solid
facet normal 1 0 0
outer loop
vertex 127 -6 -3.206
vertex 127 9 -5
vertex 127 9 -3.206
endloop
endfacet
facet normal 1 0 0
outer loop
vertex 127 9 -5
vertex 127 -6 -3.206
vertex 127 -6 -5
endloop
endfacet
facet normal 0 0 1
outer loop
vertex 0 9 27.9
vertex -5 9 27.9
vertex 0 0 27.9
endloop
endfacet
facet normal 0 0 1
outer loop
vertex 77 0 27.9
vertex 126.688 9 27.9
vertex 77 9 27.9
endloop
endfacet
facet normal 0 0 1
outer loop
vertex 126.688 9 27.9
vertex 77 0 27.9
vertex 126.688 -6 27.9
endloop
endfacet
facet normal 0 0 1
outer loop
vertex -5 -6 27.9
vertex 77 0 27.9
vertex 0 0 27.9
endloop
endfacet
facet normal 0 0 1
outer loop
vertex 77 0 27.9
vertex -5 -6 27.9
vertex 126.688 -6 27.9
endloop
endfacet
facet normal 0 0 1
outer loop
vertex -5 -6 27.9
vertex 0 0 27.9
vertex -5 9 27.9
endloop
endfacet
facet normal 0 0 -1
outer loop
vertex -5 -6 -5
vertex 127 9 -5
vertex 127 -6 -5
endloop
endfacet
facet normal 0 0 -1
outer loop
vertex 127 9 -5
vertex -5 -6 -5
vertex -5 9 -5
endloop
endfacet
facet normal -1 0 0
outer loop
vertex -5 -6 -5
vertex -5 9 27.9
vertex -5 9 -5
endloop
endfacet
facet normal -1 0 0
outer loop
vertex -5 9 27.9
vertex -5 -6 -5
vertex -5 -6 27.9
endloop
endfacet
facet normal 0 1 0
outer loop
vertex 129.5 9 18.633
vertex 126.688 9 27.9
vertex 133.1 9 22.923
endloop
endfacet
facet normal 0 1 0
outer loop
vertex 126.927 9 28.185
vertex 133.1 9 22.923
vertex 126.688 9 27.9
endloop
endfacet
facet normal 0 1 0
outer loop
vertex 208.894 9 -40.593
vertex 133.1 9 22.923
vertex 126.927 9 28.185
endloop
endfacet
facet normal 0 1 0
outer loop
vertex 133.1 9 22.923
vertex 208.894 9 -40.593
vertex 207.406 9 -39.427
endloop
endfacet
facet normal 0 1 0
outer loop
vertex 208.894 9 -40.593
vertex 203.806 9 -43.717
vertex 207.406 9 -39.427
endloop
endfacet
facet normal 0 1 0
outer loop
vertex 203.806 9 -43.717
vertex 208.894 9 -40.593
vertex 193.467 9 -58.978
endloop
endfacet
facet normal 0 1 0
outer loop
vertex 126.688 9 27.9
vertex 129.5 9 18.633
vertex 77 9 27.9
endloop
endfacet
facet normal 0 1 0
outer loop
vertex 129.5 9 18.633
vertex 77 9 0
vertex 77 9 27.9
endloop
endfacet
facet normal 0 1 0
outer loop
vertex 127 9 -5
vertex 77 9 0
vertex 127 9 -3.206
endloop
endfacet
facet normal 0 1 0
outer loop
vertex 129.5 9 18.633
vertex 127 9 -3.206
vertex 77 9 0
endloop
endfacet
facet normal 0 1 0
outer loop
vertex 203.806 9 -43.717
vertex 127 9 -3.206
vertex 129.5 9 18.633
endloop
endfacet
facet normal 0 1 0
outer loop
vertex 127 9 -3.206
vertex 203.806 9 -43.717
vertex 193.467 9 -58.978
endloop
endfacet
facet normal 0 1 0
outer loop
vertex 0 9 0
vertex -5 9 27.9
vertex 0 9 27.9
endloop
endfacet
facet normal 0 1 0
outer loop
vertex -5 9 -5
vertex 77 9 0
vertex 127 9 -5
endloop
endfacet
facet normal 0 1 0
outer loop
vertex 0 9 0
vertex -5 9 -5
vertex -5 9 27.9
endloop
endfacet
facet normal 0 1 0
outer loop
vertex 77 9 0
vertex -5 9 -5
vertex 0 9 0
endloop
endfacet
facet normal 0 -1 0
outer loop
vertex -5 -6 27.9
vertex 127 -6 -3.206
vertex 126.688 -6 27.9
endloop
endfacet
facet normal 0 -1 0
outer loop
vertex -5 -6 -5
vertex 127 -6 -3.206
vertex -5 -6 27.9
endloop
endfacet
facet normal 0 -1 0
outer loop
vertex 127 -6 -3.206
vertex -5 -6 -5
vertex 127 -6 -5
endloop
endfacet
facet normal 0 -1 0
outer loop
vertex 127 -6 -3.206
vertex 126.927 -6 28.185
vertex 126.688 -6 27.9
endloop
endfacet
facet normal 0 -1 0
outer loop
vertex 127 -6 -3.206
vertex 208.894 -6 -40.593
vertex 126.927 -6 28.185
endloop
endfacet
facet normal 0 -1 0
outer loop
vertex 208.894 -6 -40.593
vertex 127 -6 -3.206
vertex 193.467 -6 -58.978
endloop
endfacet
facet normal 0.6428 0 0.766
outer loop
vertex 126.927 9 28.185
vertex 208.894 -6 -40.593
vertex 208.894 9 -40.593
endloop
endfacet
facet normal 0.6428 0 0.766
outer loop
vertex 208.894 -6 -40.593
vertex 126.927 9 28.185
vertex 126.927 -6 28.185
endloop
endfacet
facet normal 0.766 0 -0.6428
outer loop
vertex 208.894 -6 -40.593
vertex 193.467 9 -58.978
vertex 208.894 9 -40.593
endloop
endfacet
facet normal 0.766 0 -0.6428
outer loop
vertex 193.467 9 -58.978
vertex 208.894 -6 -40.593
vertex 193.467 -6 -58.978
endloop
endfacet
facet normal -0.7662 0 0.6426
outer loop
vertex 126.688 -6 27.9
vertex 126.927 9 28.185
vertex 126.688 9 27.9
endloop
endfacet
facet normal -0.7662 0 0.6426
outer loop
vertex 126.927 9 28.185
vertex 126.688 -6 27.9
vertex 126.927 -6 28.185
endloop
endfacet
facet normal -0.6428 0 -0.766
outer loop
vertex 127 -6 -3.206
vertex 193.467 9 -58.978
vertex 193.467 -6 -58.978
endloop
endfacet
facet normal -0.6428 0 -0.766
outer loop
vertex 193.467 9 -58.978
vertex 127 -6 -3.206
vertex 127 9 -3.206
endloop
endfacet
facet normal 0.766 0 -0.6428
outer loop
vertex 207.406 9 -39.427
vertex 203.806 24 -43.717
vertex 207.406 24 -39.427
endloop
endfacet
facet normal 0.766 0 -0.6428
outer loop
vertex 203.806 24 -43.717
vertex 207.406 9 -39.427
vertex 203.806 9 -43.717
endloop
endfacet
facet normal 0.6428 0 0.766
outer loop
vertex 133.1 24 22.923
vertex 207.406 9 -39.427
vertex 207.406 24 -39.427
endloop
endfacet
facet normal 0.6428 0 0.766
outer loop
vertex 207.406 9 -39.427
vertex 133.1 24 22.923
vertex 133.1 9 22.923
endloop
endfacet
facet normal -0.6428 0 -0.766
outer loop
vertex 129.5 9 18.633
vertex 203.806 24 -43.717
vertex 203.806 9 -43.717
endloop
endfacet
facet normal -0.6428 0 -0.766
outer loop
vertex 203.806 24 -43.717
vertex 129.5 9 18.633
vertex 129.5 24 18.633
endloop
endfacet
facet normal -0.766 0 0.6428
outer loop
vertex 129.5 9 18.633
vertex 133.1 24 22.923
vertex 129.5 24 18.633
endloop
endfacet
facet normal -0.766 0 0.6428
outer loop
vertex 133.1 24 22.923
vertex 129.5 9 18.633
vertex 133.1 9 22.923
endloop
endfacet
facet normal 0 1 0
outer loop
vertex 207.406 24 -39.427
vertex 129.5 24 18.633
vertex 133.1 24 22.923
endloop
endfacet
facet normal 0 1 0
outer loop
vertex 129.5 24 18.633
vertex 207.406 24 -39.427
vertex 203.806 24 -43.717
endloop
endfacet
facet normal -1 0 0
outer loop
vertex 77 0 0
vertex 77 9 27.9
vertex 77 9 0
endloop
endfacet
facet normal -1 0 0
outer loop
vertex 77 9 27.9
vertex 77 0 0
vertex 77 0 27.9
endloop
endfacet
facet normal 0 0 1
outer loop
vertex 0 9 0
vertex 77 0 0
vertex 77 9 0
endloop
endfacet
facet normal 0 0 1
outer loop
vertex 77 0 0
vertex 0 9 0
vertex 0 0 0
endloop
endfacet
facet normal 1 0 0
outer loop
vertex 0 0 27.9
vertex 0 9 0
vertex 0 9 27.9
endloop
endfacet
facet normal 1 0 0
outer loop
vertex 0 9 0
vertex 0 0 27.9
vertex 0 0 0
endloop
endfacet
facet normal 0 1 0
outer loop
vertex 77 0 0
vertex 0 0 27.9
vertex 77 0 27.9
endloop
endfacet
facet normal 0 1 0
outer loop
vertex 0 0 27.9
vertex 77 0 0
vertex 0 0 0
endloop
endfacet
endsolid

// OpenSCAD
h=28;
w=77;
l=148;

$fn = 180;

br = 45;
//cube([w,l,h]);
difference(){
union(){
//translate([-5,l-9,-5])
//cube([w+10,15,h+4.9]);

translate([-5,-6,-5])
cube([w+10 + br,15,h+4.9]);

translate([w+br/2+h/2  -2,-6,h/4+2.8])
rotate([0,40,0])
cube([w+ br-15, 15, h-4]);

translate([w+br/2+h/2 +18 -2,-6 ,  h/4+2.8  +h/3*2.05 -9-1.3])
rotate([0,40,0])
cube([w+ br-25, 30, h/5]);

}


cube([w,l,h]);
}
